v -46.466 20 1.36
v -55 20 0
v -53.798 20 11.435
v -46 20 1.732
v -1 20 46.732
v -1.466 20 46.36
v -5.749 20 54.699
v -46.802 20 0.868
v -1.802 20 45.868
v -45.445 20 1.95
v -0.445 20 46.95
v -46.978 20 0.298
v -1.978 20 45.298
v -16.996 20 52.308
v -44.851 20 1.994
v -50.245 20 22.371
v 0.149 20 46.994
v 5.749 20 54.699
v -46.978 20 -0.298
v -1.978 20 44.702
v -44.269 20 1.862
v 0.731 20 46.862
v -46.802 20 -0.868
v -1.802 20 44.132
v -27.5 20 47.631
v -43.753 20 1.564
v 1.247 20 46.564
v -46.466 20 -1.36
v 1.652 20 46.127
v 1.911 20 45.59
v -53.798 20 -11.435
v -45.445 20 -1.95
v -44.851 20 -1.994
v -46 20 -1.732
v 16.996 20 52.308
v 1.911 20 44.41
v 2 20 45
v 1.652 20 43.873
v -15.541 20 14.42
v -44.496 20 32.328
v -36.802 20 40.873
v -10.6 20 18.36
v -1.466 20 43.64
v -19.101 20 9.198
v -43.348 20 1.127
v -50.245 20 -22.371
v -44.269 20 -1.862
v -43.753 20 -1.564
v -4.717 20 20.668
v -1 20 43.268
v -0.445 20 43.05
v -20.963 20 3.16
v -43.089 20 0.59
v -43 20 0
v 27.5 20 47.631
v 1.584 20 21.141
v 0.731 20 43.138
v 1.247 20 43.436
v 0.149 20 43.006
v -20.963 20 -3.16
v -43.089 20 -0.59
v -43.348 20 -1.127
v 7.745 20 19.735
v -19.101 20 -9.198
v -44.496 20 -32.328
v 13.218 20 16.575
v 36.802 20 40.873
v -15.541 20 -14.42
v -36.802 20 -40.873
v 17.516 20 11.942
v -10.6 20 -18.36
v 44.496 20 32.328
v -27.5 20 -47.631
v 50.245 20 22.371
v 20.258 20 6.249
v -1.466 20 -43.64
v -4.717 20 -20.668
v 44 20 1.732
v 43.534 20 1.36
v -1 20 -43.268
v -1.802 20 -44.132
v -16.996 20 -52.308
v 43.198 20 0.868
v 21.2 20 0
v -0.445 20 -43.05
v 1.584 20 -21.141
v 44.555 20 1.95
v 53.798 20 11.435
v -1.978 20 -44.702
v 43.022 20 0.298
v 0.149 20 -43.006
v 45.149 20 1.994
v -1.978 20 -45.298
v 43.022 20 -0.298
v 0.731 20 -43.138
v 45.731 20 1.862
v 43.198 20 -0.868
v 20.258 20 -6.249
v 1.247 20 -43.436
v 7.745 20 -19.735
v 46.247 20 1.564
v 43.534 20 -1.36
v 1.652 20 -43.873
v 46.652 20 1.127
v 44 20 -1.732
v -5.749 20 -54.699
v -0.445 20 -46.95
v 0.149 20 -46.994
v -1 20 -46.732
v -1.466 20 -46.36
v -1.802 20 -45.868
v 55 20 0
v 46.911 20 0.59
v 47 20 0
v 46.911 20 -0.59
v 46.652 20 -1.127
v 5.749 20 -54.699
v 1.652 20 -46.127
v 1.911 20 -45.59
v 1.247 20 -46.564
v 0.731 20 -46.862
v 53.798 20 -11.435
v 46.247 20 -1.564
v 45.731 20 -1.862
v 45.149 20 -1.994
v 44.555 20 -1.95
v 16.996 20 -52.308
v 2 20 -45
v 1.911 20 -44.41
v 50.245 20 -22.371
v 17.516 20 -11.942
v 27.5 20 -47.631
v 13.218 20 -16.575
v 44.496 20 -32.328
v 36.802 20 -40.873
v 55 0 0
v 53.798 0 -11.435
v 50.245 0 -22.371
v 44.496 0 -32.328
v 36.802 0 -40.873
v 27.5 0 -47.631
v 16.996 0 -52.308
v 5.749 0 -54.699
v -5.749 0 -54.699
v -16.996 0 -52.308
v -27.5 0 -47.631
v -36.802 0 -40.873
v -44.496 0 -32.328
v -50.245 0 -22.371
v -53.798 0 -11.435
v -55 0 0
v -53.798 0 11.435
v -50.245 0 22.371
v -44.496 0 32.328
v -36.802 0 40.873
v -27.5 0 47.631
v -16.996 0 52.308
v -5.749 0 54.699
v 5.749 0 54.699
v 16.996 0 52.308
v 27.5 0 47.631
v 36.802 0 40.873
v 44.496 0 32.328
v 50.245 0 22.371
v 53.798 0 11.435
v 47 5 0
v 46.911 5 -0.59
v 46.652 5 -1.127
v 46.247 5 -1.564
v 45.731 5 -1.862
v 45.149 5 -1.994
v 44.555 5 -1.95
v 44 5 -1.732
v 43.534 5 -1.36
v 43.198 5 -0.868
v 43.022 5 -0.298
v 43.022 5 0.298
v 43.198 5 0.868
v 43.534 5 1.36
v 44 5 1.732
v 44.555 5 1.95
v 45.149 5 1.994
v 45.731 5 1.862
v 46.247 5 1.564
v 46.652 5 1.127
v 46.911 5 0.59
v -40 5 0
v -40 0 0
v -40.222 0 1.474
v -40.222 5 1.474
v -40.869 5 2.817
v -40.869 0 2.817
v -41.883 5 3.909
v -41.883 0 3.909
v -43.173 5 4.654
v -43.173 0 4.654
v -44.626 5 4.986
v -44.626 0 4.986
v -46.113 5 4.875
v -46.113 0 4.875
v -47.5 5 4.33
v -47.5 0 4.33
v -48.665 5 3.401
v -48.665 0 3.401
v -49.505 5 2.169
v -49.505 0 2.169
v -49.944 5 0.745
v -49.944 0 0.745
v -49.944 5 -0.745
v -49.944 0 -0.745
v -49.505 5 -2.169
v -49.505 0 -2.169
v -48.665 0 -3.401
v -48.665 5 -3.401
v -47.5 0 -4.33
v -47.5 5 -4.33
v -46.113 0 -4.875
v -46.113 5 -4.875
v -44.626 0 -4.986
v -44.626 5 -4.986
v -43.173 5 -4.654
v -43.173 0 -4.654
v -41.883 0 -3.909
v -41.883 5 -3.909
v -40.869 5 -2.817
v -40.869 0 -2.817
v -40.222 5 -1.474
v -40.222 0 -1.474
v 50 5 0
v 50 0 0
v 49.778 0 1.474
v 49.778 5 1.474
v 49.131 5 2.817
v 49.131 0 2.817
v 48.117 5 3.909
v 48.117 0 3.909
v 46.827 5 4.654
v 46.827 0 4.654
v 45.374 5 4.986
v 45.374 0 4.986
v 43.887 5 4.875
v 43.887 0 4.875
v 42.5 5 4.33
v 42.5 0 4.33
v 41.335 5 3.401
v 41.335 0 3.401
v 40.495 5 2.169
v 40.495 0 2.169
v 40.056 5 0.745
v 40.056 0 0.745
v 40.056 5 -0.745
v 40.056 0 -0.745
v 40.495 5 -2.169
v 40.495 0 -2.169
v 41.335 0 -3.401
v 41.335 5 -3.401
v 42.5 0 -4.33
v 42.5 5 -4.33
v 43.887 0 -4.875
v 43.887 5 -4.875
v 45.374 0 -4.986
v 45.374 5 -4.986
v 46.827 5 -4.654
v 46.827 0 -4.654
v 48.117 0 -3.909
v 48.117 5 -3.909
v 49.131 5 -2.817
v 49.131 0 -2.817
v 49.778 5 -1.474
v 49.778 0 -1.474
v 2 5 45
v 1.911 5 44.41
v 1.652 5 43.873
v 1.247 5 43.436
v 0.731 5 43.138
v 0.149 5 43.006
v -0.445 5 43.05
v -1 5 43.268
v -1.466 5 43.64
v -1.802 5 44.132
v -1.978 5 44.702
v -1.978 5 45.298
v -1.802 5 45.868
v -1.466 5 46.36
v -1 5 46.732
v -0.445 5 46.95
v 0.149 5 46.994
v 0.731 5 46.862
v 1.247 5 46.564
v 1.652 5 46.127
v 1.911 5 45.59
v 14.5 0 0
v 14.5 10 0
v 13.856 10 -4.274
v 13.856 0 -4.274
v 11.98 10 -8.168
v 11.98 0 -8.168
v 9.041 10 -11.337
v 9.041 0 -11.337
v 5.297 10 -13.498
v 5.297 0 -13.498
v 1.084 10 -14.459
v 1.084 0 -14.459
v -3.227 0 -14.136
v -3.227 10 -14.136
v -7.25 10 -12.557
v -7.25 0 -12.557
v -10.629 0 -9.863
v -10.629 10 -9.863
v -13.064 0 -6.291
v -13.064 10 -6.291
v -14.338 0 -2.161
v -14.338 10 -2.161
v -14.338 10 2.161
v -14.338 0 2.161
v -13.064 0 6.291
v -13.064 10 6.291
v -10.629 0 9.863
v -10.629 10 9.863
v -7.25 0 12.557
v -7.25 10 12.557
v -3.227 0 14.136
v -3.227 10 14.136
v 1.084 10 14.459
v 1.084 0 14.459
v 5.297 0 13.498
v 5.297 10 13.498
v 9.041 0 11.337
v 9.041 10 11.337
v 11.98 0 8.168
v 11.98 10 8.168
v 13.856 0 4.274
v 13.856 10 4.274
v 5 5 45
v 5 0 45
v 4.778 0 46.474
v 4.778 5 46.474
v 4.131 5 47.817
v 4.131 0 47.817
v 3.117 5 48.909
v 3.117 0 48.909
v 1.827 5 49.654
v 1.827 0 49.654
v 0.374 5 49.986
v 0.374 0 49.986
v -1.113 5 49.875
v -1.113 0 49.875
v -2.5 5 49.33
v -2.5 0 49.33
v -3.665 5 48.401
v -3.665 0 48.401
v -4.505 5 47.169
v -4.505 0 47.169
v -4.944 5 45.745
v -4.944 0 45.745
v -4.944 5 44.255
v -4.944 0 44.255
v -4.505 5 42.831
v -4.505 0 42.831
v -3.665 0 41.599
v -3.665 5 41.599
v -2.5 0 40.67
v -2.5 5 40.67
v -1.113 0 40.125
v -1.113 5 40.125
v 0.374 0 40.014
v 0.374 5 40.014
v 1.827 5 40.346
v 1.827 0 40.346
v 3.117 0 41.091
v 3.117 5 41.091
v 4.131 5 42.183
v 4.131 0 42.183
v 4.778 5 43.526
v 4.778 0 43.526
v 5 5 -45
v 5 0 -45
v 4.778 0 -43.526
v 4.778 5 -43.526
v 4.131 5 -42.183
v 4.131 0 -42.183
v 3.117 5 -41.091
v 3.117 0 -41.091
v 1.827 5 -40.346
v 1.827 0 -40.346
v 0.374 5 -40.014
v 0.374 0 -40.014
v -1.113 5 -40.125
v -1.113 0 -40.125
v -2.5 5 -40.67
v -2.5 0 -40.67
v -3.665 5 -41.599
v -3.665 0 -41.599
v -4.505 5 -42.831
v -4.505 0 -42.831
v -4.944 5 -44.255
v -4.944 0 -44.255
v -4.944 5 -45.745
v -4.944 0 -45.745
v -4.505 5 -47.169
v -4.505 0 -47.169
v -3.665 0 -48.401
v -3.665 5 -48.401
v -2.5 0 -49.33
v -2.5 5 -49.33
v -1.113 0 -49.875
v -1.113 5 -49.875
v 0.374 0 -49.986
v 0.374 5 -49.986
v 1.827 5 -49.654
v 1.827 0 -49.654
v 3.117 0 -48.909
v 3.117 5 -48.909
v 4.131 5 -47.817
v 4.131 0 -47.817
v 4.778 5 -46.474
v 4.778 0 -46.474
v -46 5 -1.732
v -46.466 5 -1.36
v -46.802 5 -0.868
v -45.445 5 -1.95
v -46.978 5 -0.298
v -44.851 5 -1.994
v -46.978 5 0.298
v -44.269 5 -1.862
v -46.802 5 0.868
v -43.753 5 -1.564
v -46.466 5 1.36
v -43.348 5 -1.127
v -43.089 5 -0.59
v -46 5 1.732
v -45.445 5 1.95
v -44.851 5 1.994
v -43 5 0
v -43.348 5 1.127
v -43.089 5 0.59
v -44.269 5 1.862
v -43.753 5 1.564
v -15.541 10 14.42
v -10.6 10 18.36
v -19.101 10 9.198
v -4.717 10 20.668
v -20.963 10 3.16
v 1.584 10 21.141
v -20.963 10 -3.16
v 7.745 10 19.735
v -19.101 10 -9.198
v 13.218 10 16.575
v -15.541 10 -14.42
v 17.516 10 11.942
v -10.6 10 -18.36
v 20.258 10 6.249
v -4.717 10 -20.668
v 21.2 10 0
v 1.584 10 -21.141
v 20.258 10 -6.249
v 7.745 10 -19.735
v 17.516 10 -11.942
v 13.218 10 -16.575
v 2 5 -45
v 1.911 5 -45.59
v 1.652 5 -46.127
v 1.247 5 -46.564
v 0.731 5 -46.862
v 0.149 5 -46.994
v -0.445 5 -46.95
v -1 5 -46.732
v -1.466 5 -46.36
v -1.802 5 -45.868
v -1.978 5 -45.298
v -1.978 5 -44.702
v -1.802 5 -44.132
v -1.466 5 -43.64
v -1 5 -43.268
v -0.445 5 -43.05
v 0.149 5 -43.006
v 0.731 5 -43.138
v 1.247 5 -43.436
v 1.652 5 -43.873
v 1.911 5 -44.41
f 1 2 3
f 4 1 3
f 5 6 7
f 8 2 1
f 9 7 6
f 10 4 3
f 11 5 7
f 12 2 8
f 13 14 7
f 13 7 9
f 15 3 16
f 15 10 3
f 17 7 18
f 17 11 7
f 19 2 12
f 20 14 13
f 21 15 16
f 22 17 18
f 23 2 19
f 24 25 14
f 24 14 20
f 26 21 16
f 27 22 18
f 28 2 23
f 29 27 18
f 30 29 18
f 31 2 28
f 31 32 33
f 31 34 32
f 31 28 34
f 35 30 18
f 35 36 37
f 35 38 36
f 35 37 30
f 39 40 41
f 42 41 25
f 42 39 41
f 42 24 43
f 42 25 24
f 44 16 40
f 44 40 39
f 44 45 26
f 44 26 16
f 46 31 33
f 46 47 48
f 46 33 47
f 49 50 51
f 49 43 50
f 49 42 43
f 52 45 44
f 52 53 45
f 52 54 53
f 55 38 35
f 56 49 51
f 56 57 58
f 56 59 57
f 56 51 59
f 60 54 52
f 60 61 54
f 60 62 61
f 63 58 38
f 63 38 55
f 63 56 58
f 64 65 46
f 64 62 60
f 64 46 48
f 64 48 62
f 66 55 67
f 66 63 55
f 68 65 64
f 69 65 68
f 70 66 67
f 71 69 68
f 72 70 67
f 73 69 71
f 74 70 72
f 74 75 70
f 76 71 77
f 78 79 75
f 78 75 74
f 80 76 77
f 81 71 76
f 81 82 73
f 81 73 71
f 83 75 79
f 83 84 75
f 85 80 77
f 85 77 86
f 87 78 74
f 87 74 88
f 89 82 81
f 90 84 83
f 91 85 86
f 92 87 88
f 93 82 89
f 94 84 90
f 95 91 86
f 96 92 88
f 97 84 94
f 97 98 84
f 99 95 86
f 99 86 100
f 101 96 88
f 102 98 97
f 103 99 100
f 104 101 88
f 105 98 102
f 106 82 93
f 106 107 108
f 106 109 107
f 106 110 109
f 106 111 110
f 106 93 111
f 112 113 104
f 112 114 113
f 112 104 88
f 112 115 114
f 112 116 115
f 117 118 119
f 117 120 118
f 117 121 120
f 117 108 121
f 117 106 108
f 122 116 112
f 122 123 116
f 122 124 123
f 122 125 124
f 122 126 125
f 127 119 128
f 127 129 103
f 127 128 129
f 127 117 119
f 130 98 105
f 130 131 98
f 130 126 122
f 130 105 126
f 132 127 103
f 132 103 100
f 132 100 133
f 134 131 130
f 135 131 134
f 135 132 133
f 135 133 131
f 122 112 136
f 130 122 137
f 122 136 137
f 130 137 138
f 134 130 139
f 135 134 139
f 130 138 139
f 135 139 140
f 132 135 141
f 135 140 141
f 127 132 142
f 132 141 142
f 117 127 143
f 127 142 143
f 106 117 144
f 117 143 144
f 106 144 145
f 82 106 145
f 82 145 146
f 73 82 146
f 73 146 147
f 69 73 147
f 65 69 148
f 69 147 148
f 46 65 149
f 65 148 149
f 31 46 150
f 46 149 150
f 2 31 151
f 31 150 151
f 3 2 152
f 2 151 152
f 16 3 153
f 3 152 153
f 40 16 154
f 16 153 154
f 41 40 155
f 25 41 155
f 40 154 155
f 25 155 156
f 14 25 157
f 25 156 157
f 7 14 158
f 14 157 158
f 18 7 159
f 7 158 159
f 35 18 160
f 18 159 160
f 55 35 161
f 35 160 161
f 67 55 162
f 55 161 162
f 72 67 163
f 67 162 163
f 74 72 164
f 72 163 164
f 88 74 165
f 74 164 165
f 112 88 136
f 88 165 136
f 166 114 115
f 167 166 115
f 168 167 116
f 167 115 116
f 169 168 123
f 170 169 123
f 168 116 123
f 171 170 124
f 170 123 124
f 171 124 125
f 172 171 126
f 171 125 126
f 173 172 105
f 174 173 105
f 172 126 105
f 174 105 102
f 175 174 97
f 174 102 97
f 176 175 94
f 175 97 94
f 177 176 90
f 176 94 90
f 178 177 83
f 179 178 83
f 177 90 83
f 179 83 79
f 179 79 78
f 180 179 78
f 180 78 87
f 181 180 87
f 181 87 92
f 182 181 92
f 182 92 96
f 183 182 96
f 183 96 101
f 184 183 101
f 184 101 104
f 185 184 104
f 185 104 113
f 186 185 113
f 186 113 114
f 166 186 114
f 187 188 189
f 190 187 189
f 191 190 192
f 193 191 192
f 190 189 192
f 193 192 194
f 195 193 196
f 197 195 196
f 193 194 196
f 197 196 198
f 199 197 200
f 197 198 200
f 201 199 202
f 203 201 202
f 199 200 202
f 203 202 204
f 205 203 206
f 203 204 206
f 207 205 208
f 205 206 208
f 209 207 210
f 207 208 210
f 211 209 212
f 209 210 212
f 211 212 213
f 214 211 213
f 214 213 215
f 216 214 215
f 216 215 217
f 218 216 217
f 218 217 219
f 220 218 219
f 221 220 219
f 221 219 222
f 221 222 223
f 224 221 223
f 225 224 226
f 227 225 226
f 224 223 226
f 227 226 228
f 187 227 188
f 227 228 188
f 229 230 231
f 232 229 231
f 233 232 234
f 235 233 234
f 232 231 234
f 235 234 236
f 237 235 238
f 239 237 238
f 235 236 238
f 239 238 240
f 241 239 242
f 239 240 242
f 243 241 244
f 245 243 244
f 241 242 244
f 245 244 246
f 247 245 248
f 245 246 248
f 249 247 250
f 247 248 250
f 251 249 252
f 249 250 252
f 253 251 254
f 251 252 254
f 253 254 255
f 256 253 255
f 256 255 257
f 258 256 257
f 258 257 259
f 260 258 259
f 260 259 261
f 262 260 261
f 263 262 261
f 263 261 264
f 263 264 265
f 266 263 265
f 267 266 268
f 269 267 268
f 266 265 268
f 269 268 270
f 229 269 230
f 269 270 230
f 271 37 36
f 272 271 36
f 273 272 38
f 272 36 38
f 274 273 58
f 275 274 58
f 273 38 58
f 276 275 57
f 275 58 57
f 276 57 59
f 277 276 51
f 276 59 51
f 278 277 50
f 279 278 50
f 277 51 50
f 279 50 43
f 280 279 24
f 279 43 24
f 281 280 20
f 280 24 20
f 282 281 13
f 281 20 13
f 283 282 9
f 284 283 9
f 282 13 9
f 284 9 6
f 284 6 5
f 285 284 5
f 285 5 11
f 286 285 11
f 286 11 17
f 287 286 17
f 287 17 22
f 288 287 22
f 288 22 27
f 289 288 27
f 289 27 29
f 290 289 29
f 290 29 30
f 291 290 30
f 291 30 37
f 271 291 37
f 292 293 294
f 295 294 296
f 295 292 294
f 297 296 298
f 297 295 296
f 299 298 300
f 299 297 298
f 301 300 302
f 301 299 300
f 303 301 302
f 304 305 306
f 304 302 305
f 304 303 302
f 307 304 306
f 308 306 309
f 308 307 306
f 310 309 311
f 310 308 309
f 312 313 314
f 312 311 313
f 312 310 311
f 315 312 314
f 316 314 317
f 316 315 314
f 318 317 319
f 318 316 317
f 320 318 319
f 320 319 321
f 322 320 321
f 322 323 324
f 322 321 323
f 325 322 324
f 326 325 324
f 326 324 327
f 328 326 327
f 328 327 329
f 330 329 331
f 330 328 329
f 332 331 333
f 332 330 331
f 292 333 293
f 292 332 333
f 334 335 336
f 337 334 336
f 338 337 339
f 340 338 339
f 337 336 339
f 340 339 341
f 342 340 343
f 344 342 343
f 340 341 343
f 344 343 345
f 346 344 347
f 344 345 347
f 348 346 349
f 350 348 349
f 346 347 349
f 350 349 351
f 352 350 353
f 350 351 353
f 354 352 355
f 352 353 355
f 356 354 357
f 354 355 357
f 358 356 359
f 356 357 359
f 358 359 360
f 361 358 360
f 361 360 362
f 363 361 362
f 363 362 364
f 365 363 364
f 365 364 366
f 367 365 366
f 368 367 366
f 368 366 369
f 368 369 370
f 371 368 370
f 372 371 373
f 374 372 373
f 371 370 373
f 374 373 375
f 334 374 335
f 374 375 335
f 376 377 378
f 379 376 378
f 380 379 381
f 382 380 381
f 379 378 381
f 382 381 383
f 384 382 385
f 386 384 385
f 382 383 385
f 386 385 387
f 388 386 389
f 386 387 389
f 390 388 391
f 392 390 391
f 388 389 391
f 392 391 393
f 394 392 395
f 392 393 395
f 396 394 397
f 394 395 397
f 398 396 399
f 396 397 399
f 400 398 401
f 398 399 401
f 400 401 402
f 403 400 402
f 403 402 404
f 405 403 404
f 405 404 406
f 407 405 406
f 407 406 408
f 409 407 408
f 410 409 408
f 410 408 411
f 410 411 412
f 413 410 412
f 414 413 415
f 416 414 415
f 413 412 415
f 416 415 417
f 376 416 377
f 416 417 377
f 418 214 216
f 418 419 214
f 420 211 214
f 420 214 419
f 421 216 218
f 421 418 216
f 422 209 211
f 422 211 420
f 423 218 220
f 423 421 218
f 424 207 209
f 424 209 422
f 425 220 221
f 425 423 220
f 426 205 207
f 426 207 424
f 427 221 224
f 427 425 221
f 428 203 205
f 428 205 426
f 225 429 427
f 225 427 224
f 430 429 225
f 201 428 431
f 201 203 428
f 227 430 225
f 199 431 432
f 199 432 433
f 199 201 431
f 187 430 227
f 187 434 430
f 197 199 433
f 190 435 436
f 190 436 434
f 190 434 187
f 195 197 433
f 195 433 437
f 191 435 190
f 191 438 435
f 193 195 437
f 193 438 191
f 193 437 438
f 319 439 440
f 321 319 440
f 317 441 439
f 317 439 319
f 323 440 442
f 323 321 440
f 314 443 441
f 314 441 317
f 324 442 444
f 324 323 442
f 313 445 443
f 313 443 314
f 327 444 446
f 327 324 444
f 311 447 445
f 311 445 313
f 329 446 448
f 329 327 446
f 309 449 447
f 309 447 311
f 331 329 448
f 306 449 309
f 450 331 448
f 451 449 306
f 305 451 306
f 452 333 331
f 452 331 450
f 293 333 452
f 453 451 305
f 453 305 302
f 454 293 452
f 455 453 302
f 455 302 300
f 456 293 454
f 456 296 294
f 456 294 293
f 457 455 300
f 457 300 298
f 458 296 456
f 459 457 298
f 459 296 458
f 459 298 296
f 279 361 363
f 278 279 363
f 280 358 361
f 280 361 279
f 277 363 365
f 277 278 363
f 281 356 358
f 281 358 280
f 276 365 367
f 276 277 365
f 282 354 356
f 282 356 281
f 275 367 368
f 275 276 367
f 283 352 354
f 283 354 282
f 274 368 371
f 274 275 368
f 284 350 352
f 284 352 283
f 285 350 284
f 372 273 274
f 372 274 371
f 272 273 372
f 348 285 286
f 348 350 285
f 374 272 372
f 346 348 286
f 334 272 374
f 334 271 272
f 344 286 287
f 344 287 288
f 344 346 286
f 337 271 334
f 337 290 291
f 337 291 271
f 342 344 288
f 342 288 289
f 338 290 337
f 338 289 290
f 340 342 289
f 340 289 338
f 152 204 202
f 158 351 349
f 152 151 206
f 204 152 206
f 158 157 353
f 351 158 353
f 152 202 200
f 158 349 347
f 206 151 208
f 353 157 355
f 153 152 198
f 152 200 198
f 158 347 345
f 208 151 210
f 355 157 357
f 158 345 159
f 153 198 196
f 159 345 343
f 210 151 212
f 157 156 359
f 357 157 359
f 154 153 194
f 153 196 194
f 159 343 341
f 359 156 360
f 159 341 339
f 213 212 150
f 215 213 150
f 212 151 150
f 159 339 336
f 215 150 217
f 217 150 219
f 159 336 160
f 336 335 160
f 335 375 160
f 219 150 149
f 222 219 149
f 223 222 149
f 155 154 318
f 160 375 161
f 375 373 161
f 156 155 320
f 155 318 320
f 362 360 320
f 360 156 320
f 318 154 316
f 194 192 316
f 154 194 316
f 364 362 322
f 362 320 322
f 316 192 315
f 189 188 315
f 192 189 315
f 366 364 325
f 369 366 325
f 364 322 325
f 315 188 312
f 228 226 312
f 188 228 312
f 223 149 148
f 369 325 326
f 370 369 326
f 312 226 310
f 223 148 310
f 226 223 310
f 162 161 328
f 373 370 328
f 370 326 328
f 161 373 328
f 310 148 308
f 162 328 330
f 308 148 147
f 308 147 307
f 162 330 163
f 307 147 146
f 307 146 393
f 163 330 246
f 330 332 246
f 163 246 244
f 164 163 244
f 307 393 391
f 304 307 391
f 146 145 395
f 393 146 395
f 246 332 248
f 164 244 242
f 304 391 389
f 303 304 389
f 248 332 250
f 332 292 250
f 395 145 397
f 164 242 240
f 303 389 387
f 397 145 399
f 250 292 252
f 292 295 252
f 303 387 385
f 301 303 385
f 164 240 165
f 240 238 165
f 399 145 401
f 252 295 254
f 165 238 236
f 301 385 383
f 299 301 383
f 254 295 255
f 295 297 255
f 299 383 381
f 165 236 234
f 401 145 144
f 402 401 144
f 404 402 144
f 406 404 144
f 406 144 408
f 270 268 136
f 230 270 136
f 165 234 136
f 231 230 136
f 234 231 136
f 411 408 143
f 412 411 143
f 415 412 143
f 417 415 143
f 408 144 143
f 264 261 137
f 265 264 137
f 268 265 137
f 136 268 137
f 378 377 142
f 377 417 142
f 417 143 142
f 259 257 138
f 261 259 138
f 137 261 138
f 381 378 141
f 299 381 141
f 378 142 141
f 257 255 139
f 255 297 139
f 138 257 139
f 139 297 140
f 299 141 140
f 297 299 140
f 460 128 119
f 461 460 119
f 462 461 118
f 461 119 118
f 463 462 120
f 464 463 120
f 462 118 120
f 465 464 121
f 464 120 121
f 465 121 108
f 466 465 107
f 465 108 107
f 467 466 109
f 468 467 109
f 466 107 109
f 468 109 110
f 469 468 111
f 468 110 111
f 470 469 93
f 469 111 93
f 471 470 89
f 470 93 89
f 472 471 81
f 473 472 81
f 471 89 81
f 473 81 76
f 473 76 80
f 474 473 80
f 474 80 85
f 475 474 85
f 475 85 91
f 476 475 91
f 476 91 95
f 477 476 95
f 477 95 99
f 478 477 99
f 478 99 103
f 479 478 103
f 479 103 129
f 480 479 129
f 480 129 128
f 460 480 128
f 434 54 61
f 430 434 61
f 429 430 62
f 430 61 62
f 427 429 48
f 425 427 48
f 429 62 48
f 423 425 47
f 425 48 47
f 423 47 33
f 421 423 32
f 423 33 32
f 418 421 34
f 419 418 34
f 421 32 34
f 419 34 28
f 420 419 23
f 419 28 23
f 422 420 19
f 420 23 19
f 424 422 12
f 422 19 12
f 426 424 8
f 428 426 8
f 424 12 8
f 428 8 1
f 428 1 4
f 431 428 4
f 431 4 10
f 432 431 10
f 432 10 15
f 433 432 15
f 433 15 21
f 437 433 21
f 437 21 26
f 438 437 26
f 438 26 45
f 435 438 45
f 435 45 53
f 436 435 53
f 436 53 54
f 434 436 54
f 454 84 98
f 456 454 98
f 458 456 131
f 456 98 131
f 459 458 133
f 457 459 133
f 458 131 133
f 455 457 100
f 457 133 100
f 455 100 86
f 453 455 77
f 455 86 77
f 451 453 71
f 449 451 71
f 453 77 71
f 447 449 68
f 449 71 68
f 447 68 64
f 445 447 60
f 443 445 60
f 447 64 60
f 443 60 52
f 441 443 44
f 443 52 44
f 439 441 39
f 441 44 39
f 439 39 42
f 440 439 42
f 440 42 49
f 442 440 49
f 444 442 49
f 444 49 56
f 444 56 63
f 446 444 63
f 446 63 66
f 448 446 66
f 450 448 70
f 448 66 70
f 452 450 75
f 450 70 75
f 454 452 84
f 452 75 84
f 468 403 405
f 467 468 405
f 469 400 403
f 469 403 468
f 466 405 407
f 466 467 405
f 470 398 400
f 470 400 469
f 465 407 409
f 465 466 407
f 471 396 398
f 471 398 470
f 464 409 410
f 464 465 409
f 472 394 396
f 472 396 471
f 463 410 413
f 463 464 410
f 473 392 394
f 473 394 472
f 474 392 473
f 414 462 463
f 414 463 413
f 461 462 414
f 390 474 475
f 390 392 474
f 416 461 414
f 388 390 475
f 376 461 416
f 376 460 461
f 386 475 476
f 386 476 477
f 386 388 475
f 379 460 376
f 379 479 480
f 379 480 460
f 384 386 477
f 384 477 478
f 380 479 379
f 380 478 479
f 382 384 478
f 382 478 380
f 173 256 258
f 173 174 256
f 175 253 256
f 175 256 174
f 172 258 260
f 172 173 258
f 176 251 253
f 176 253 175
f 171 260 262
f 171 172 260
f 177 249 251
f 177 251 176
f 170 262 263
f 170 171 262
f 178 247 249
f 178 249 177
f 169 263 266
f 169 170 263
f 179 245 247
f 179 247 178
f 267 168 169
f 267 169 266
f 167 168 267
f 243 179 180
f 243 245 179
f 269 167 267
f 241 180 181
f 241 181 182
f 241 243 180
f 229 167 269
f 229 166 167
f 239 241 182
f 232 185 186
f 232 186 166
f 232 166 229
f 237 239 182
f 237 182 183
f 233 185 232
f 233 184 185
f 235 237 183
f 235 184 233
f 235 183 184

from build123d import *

# Parameters (mm, degrees)
SKETCH1_R           = 55
SKETCH1_R_2         = 14.5
BOSS_EXTRUDE1_DEPTH = 20
SKETCH2_R           = 21.2
CUT_EXTRUDE1_DEPTH  = 10
SKETCH4_R           = 2
CUT_EXTRUDE2_DEPTH  = 20
SKETCH6_R           = 5
CUT_EXTRUDE3_DEPTH  = 5


with BuildPart() as part:
    # Sketch1 → Boss-Extrude1 (new body)
    with BuildSketch(Plane(origin=(0, 0, 0), x_dir=(1, 0, 0), z_dir=(0, 1, 0))):
        Circle(SKETCH1_R)
        Circle(SKETCH1_R_2, mode=Mode.SUBTRACT)
    extrude(amount=BOSS_EXTRUDE1_DEPTH)

    # Sketch2 → Cut-Extrude1 (cut)
    with BuildSketch(Plane(origin=(0, 20, 0), x_dir=(1, 0, 0), z_dir=(0, 1, 0))):
        Circle(SKETCH2_R)
    extrude(amount=-CUT_EXTRUDE1_DEPTH, mode=Mode.SUBTRACT)

    # Sketch4 → Cut-Extrude2 (cut)
    with BuildSketch(Plane(origin=(0, 20, 0), x_dir=(1, 0, 0), z_dir=(0, 1, 0))):
        with Locations((0, 45)):
            Circle(SKETCH4_R)
        with Locations((45, 0)):
            Circle(SKETCH4_R)
        with Locations((0, -45)):
            Circle(SKETCH4_R)
        with Locations((-45, 0)):
            Circle(SKETCH4_R)
    extrude(amount=-CUT_EXTRUDE2_DEPTH, mode=Mode.SUBTRACT)

    # Sketch6 → Cut-Extrude3 (cut)
    with BuildSketch(Plane.XZ):
        with Locations((0, 45)):
            Circle(SKETCH6_R)
        with Locations((45, 0)):
            Circle(SKETCH6_R)
        with Locations((0, -45)):
            Circle(SKETCH6_R)
        with Locations((-45, 0)):
            Circle(SKETCH6_R)
    extrude(amount=-CUT_EXTRUDE3_DEPTH, mode=Mode.SUBTRACT)


solid = part.part
